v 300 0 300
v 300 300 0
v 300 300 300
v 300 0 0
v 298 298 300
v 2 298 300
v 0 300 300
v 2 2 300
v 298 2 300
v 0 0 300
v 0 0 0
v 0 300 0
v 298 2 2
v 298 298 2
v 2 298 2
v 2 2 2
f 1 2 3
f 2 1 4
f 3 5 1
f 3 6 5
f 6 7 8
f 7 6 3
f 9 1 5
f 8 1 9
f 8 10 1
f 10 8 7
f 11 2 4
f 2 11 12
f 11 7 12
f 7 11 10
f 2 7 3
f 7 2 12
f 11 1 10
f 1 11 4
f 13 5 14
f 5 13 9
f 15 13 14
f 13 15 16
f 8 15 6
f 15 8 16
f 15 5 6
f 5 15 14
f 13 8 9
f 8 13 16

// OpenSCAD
$fn = 64; // Качество окружностей

// Параметры куба
CUBE_SIZE = 300; // Размер куба (300x300x300 мм)
WALL_THICKNESS = 2; // Толщина стенок

// Создаем полый куб без верхней крышки
difference() {
  // Внешний куб
  cube([CUBE_SIZE, CUBE_SIZE, CUBE_SIZE]);

  // Вырезаем внутреннюю полость (верх открыт)
  translate([WALL_THICKNESS, WALL_THICKNESS, WALL_THICKNESS])
    cube(
      [
        CUBE_SIZE - WALL_THICKNESS * 2,
        CUBE_SIZE - WALL_THICKNESS * 2,
        CUBE_SIZE + 0.1,
      ]
    );
  // Вырезаем до верха, чтобы верх был открыт
}
